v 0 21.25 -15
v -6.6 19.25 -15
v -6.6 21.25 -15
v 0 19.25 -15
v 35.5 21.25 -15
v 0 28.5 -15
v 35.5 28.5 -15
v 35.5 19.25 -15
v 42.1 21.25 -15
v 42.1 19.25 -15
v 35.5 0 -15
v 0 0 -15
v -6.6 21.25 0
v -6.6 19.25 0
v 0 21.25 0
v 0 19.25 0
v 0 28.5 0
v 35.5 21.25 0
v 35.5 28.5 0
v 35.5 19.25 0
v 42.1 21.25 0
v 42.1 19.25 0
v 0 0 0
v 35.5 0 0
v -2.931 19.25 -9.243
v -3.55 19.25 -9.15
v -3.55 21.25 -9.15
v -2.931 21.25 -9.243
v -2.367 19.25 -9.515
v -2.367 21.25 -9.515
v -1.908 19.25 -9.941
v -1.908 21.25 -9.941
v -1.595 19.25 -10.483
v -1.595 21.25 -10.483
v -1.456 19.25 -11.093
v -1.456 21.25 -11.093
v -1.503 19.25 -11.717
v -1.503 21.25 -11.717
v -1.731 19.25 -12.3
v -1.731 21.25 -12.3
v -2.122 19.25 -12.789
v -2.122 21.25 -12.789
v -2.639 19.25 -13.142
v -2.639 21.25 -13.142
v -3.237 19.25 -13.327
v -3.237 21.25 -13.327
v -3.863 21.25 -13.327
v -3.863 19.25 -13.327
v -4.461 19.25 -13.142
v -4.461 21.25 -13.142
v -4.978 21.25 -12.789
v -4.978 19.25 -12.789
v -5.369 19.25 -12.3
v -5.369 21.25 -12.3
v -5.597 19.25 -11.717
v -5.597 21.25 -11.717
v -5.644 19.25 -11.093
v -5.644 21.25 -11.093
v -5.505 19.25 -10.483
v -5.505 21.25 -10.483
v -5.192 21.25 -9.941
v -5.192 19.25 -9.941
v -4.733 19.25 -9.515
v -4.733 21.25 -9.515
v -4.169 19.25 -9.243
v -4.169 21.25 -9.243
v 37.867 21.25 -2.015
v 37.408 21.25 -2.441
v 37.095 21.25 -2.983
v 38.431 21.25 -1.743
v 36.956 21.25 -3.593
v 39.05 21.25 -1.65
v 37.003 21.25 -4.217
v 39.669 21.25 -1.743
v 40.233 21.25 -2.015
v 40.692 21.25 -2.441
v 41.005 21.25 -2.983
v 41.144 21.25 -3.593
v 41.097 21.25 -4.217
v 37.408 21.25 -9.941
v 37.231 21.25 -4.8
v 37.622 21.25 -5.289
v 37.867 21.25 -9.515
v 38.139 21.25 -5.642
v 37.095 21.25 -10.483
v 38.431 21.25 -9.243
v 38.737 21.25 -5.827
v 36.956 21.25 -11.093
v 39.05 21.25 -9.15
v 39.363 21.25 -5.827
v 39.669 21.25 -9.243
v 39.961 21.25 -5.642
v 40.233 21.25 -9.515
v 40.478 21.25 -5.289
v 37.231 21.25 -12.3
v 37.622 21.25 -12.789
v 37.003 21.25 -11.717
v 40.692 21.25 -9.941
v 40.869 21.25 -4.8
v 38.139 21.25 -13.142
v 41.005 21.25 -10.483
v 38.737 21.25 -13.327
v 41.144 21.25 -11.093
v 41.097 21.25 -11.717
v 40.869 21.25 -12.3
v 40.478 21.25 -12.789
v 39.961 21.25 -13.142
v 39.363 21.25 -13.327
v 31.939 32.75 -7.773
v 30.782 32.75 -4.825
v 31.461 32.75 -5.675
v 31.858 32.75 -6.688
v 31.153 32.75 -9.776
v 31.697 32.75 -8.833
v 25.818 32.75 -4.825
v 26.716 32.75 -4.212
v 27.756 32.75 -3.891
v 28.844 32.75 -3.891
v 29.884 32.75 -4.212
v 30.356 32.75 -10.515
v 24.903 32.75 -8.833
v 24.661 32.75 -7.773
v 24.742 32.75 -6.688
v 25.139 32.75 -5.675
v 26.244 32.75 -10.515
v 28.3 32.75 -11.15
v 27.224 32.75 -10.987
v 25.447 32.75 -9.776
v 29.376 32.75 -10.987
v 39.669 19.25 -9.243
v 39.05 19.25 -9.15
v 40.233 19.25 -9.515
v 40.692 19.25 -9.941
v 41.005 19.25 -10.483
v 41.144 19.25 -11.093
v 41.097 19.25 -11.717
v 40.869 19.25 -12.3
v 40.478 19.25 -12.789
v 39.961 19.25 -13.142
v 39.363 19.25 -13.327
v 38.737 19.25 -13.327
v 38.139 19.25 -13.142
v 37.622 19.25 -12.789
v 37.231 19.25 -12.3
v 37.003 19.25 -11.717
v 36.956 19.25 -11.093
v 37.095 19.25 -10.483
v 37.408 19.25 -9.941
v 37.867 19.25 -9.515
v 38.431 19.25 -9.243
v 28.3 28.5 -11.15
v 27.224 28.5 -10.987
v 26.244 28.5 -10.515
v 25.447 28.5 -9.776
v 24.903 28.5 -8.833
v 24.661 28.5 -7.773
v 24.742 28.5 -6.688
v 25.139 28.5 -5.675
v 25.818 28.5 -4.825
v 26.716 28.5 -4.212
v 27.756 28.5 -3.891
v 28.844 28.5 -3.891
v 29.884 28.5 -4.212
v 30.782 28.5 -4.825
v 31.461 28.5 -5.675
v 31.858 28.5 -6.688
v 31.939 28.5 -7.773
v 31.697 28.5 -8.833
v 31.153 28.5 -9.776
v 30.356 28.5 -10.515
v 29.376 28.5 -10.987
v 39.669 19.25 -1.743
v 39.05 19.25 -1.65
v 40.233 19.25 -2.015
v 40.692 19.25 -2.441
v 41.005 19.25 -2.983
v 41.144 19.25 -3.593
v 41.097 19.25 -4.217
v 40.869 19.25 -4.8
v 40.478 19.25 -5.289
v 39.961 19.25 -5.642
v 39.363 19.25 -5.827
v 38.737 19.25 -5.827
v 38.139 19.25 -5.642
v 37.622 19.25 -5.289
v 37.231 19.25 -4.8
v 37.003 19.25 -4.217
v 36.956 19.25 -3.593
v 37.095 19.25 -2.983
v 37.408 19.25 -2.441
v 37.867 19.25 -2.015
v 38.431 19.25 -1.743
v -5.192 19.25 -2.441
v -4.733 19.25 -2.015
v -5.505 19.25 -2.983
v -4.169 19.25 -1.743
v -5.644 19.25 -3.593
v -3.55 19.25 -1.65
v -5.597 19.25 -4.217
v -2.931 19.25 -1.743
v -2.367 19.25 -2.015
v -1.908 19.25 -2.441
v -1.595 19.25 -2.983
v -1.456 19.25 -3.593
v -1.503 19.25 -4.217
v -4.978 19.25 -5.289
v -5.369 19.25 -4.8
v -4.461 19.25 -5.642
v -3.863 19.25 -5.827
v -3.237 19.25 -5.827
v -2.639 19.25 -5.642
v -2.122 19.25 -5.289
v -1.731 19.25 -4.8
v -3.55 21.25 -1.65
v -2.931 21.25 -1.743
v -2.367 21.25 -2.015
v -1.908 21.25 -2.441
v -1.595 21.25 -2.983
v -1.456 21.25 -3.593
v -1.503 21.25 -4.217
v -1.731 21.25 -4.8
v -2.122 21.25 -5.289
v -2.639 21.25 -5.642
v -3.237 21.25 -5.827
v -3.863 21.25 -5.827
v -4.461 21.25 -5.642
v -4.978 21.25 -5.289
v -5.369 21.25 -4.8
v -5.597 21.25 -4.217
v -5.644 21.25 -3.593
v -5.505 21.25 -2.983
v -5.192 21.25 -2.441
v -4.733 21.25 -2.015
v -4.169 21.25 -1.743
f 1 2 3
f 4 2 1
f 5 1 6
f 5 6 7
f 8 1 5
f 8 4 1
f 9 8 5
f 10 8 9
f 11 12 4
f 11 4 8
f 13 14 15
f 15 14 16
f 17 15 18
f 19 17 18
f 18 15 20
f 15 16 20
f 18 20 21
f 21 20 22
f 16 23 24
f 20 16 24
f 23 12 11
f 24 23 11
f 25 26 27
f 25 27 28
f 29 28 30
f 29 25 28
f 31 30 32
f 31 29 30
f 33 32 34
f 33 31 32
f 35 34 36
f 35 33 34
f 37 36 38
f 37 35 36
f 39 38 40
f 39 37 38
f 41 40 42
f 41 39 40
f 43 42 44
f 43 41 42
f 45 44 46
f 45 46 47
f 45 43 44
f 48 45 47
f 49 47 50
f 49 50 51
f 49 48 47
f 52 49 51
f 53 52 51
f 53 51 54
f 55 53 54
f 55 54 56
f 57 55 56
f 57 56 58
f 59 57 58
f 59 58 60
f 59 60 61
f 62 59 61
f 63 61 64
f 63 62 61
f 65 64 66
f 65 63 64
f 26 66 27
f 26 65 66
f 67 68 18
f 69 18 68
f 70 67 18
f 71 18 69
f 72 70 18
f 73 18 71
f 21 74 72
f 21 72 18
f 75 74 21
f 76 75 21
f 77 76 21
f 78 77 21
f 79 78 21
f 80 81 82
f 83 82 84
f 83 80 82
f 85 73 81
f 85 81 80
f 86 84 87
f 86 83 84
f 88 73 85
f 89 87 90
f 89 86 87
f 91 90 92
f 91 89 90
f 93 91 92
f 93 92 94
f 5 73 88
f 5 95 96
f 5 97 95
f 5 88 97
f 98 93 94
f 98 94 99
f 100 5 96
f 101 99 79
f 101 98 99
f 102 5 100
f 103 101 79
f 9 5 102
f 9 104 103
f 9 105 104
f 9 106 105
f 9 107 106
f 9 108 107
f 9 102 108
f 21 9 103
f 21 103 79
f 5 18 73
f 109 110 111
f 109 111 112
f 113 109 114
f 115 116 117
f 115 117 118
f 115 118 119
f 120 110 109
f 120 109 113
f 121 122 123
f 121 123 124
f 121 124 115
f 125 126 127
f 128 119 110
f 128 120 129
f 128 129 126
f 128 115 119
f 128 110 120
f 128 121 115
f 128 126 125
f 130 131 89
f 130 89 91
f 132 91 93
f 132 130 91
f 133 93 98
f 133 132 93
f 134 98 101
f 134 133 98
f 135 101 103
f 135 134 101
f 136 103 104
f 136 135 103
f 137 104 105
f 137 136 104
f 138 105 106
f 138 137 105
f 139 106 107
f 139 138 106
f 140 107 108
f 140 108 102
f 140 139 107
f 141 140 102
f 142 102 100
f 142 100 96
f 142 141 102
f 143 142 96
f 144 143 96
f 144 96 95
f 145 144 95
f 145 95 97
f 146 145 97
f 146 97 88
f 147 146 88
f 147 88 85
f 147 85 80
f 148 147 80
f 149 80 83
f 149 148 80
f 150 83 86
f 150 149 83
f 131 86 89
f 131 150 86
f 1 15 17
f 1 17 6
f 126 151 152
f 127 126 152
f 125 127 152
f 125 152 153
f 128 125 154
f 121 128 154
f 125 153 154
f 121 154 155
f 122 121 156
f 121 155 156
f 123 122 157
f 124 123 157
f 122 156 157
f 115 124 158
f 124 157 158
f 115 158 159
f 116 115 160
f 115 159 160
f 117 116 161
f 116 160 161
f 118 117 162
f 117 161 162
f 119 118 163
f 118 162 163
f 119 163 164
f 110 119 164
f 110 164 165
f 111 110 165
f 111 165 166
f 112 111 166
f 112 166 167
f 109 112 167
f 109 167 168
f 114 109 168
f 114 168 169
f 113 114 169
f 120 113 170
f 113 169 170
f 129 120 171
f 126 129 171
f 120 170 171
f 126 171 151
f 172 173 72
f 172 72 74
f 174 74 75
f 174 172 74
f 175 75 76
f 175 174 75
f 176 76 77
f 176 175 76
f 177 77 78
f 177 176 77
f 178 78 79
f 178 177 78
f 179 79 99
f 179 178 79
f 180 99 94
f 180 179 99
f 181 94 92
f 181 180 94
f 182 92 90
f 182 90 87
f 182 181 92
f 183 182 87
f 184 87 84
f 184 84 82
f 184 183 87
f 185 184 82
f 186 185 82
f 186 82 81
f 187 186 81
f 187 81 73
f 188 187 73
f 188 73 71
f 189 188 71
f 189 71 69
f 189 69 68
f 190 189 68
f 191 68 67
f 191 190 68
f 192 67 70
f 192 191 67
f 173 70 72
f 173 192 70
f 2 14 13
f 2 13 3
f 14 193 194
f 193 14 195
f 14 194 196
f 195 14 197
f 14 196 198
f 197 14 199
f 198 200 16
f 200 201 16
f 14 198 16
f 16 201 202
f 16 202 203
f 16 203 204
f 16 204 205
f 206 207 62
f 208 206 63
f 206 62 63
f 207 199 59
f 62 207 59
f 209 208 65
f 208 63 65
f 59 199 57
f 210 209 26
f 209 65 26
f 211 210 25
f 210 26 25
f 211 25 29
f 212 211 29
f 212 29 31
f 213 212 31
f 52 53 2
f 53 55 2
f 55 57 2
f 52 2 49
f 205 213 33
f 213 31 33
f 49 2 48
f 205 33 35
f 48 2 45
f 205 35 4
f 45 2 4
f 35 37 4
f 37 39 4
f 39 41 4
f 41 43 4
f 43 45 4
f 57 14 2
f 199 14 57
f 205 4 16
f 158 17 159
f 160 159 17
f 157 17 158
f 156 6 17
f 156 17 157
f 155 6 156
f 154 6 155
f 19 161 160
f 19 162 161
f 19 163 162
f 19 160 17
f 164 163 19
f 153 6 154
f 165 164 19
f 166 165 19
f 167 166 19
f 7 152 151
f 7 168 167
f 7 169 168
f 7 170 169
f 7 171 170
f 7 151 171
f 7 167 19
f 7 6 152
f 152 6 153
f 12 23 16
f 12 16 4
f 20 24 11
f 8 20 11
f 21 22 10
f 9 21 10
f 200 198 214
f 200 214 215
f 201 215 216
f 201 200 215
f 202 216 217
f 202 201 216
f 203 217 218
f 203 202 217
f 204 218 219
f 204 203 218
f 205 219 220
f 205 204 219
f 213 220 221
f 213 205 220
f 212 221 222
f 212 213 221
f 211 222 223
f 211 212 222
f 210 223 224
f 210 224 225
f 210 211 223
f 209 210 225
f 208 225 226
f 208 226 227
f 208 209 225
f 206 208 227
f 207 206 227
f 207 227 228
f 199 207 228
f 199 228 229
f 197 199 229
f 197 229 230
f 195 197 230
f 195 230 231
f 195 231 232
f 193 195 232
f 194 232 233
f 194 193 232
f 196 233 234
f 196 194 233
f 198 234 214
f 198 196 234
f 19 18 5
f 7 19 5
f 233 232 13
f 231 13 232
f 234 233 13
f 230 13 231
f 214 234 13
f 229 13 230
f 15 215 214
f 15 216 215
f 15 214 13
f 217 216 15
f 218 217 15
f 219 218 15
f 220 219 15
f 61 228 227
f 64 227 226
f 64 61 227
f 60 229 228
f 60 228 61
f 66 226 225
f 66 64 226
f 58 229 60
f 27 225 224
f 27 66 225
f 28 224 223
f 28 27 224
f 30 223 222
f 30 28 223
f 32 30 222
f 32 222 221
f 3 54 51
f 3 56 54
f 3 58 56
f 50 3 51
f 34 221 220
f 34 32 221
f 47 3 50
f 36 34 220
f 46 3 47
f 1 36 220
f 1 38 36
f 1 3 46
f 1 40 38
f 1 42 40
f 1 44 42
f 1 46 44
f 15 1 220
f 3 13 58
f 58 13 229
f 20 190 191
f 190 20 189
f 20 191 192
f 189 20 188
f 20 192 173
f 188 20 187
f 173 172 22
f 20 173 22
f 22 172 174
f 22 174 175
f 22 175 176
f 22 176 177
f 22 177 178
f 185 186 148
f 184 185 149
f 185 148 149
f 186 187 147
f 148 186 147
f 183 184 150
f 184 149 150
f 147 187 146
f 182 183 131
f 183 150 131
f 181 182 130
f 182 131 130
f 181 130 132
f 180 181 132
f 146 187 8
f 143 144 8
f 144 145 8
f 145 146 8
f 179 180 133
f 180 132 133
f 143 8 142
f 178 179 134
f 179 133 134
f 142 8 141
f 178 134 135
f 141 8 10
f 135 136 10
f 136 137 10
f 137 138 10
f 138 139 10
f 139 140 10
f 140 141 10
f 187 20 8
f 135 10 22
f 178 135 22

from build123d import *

# Parameters (mm, degrees)
SKETCH_1_W      = 35.5
SKETCH_1_H      = 15
EXTRUDE_1_DEPTH = 19.25
SKETCH_2_W      = 35.5
SKETCH_2_H      = 15
SKETCH_2_W_2    = 6.6
SKETCH_2_R      = 2.1
EXTRUDE_2_DEPTH = 2
SKETCH_3_W      = 35.5
SKETCH_3_H      = 15
EXTRUDE_3_DEPTH = 7.25
SKETCH_4_R      = 3.649626988
EXTRUDE_4_DEPTH = 4.25


with BuildPart() as part:
    # 草图1 → 凸台-拉伸1 (new body)
    with BuildSketch(Plane(origin=(0, 0, 0), x_dir=(1, 0, 0), z_dir=(0, 1, 0))):
        with Locations((17.75, 7.5)):
            Rectangle(SKETCH_1_W, SKETCH_1_H)
    extrude(amount=EXTRUDE_1_DEPTH)

    # 草图2 → 凸台-拉伸2 (add)
    # profile 1 of 3: a face of its own
    with BuildSketch(Plane(origin=(0, 19.25, 0), x_dir=(1, 0, 0), z_dir=(0, 1, 0))):
        with Locations((17.75, 7.5)):
            Rectangle(SKETCH_2_W, SKETCH_2_H)
    # profile 2 of 3: a face of its own
    with BuildSketch(Plane(origin=(0, 19.25, 0), x_dir=(1, 0, 0), z_dir=(0, 1, 0))):
        with Locations((38.8, 7.5)):
            Rectangle(SKETCH_2_W_2, SKETCH_2_H)
        with Locations(Location((39.05, 3.75, 0), (0, 0, 270))):
            Circle(SKETCH_2_R, mode=Mode.SUBTRACT)
        with Locations(Location((39.05, 11.25, 0), (0, 0, 270))):
            Circle(SKETCH_2_R, mode=Mode.SUBTRACT)
    # profile 3 of 3: a face of its own
    with BuildSketch(Plane(origin=(0, 19.25, 0), x_dir=(1, 0, 0), z_dir=(0, 1, 0))):
        with Locations((-3.3, 7.5)):
            Rectangle(SKETCH_2_W_2, SKETCH_2_H)
        with Locations(Location((-3.55, 3.75, 0), (0, 0, 270))):
            Circle(SKETCH_2_R, mode=Mode.SUBTRACT)
        with Locations(Location((-3.55, 11.25, 0), (0, 0, 270))):
            Circle(SKETCH_2_R, mode=Mode.SUBTRACT)
    extrude(amount=EXTRUDE_2_DEPTH)

    # 草图3 → 凸台-拉伸3 (add)
    with BuildSketch(Plane(origin=(0, 21.25, 0), x_dir=(1, 0, 0), z_dir=(0, 1, 0))):
        with Locations((17.75, 7.5)):
            Rectangle(SKETCH_3_W, SKETCH_3_H)
    extrude(amount=EXTRUDE_3_DEPTH)

    # 草图4 → 凸台-拉伸4 (add)
    with BuildSketch(Plane(origin=(0, 28.5, 0), x_dir=(1, 0, 0), z_dir=(0, 1, 0))):
        with Locations(Location((28.3, 7.5, 0), (0, 0, 90))):
            Circle(SKETCH_4_R)
    extrude(amount=EXTRUDE_4_DEPTH)


solid = part.part
